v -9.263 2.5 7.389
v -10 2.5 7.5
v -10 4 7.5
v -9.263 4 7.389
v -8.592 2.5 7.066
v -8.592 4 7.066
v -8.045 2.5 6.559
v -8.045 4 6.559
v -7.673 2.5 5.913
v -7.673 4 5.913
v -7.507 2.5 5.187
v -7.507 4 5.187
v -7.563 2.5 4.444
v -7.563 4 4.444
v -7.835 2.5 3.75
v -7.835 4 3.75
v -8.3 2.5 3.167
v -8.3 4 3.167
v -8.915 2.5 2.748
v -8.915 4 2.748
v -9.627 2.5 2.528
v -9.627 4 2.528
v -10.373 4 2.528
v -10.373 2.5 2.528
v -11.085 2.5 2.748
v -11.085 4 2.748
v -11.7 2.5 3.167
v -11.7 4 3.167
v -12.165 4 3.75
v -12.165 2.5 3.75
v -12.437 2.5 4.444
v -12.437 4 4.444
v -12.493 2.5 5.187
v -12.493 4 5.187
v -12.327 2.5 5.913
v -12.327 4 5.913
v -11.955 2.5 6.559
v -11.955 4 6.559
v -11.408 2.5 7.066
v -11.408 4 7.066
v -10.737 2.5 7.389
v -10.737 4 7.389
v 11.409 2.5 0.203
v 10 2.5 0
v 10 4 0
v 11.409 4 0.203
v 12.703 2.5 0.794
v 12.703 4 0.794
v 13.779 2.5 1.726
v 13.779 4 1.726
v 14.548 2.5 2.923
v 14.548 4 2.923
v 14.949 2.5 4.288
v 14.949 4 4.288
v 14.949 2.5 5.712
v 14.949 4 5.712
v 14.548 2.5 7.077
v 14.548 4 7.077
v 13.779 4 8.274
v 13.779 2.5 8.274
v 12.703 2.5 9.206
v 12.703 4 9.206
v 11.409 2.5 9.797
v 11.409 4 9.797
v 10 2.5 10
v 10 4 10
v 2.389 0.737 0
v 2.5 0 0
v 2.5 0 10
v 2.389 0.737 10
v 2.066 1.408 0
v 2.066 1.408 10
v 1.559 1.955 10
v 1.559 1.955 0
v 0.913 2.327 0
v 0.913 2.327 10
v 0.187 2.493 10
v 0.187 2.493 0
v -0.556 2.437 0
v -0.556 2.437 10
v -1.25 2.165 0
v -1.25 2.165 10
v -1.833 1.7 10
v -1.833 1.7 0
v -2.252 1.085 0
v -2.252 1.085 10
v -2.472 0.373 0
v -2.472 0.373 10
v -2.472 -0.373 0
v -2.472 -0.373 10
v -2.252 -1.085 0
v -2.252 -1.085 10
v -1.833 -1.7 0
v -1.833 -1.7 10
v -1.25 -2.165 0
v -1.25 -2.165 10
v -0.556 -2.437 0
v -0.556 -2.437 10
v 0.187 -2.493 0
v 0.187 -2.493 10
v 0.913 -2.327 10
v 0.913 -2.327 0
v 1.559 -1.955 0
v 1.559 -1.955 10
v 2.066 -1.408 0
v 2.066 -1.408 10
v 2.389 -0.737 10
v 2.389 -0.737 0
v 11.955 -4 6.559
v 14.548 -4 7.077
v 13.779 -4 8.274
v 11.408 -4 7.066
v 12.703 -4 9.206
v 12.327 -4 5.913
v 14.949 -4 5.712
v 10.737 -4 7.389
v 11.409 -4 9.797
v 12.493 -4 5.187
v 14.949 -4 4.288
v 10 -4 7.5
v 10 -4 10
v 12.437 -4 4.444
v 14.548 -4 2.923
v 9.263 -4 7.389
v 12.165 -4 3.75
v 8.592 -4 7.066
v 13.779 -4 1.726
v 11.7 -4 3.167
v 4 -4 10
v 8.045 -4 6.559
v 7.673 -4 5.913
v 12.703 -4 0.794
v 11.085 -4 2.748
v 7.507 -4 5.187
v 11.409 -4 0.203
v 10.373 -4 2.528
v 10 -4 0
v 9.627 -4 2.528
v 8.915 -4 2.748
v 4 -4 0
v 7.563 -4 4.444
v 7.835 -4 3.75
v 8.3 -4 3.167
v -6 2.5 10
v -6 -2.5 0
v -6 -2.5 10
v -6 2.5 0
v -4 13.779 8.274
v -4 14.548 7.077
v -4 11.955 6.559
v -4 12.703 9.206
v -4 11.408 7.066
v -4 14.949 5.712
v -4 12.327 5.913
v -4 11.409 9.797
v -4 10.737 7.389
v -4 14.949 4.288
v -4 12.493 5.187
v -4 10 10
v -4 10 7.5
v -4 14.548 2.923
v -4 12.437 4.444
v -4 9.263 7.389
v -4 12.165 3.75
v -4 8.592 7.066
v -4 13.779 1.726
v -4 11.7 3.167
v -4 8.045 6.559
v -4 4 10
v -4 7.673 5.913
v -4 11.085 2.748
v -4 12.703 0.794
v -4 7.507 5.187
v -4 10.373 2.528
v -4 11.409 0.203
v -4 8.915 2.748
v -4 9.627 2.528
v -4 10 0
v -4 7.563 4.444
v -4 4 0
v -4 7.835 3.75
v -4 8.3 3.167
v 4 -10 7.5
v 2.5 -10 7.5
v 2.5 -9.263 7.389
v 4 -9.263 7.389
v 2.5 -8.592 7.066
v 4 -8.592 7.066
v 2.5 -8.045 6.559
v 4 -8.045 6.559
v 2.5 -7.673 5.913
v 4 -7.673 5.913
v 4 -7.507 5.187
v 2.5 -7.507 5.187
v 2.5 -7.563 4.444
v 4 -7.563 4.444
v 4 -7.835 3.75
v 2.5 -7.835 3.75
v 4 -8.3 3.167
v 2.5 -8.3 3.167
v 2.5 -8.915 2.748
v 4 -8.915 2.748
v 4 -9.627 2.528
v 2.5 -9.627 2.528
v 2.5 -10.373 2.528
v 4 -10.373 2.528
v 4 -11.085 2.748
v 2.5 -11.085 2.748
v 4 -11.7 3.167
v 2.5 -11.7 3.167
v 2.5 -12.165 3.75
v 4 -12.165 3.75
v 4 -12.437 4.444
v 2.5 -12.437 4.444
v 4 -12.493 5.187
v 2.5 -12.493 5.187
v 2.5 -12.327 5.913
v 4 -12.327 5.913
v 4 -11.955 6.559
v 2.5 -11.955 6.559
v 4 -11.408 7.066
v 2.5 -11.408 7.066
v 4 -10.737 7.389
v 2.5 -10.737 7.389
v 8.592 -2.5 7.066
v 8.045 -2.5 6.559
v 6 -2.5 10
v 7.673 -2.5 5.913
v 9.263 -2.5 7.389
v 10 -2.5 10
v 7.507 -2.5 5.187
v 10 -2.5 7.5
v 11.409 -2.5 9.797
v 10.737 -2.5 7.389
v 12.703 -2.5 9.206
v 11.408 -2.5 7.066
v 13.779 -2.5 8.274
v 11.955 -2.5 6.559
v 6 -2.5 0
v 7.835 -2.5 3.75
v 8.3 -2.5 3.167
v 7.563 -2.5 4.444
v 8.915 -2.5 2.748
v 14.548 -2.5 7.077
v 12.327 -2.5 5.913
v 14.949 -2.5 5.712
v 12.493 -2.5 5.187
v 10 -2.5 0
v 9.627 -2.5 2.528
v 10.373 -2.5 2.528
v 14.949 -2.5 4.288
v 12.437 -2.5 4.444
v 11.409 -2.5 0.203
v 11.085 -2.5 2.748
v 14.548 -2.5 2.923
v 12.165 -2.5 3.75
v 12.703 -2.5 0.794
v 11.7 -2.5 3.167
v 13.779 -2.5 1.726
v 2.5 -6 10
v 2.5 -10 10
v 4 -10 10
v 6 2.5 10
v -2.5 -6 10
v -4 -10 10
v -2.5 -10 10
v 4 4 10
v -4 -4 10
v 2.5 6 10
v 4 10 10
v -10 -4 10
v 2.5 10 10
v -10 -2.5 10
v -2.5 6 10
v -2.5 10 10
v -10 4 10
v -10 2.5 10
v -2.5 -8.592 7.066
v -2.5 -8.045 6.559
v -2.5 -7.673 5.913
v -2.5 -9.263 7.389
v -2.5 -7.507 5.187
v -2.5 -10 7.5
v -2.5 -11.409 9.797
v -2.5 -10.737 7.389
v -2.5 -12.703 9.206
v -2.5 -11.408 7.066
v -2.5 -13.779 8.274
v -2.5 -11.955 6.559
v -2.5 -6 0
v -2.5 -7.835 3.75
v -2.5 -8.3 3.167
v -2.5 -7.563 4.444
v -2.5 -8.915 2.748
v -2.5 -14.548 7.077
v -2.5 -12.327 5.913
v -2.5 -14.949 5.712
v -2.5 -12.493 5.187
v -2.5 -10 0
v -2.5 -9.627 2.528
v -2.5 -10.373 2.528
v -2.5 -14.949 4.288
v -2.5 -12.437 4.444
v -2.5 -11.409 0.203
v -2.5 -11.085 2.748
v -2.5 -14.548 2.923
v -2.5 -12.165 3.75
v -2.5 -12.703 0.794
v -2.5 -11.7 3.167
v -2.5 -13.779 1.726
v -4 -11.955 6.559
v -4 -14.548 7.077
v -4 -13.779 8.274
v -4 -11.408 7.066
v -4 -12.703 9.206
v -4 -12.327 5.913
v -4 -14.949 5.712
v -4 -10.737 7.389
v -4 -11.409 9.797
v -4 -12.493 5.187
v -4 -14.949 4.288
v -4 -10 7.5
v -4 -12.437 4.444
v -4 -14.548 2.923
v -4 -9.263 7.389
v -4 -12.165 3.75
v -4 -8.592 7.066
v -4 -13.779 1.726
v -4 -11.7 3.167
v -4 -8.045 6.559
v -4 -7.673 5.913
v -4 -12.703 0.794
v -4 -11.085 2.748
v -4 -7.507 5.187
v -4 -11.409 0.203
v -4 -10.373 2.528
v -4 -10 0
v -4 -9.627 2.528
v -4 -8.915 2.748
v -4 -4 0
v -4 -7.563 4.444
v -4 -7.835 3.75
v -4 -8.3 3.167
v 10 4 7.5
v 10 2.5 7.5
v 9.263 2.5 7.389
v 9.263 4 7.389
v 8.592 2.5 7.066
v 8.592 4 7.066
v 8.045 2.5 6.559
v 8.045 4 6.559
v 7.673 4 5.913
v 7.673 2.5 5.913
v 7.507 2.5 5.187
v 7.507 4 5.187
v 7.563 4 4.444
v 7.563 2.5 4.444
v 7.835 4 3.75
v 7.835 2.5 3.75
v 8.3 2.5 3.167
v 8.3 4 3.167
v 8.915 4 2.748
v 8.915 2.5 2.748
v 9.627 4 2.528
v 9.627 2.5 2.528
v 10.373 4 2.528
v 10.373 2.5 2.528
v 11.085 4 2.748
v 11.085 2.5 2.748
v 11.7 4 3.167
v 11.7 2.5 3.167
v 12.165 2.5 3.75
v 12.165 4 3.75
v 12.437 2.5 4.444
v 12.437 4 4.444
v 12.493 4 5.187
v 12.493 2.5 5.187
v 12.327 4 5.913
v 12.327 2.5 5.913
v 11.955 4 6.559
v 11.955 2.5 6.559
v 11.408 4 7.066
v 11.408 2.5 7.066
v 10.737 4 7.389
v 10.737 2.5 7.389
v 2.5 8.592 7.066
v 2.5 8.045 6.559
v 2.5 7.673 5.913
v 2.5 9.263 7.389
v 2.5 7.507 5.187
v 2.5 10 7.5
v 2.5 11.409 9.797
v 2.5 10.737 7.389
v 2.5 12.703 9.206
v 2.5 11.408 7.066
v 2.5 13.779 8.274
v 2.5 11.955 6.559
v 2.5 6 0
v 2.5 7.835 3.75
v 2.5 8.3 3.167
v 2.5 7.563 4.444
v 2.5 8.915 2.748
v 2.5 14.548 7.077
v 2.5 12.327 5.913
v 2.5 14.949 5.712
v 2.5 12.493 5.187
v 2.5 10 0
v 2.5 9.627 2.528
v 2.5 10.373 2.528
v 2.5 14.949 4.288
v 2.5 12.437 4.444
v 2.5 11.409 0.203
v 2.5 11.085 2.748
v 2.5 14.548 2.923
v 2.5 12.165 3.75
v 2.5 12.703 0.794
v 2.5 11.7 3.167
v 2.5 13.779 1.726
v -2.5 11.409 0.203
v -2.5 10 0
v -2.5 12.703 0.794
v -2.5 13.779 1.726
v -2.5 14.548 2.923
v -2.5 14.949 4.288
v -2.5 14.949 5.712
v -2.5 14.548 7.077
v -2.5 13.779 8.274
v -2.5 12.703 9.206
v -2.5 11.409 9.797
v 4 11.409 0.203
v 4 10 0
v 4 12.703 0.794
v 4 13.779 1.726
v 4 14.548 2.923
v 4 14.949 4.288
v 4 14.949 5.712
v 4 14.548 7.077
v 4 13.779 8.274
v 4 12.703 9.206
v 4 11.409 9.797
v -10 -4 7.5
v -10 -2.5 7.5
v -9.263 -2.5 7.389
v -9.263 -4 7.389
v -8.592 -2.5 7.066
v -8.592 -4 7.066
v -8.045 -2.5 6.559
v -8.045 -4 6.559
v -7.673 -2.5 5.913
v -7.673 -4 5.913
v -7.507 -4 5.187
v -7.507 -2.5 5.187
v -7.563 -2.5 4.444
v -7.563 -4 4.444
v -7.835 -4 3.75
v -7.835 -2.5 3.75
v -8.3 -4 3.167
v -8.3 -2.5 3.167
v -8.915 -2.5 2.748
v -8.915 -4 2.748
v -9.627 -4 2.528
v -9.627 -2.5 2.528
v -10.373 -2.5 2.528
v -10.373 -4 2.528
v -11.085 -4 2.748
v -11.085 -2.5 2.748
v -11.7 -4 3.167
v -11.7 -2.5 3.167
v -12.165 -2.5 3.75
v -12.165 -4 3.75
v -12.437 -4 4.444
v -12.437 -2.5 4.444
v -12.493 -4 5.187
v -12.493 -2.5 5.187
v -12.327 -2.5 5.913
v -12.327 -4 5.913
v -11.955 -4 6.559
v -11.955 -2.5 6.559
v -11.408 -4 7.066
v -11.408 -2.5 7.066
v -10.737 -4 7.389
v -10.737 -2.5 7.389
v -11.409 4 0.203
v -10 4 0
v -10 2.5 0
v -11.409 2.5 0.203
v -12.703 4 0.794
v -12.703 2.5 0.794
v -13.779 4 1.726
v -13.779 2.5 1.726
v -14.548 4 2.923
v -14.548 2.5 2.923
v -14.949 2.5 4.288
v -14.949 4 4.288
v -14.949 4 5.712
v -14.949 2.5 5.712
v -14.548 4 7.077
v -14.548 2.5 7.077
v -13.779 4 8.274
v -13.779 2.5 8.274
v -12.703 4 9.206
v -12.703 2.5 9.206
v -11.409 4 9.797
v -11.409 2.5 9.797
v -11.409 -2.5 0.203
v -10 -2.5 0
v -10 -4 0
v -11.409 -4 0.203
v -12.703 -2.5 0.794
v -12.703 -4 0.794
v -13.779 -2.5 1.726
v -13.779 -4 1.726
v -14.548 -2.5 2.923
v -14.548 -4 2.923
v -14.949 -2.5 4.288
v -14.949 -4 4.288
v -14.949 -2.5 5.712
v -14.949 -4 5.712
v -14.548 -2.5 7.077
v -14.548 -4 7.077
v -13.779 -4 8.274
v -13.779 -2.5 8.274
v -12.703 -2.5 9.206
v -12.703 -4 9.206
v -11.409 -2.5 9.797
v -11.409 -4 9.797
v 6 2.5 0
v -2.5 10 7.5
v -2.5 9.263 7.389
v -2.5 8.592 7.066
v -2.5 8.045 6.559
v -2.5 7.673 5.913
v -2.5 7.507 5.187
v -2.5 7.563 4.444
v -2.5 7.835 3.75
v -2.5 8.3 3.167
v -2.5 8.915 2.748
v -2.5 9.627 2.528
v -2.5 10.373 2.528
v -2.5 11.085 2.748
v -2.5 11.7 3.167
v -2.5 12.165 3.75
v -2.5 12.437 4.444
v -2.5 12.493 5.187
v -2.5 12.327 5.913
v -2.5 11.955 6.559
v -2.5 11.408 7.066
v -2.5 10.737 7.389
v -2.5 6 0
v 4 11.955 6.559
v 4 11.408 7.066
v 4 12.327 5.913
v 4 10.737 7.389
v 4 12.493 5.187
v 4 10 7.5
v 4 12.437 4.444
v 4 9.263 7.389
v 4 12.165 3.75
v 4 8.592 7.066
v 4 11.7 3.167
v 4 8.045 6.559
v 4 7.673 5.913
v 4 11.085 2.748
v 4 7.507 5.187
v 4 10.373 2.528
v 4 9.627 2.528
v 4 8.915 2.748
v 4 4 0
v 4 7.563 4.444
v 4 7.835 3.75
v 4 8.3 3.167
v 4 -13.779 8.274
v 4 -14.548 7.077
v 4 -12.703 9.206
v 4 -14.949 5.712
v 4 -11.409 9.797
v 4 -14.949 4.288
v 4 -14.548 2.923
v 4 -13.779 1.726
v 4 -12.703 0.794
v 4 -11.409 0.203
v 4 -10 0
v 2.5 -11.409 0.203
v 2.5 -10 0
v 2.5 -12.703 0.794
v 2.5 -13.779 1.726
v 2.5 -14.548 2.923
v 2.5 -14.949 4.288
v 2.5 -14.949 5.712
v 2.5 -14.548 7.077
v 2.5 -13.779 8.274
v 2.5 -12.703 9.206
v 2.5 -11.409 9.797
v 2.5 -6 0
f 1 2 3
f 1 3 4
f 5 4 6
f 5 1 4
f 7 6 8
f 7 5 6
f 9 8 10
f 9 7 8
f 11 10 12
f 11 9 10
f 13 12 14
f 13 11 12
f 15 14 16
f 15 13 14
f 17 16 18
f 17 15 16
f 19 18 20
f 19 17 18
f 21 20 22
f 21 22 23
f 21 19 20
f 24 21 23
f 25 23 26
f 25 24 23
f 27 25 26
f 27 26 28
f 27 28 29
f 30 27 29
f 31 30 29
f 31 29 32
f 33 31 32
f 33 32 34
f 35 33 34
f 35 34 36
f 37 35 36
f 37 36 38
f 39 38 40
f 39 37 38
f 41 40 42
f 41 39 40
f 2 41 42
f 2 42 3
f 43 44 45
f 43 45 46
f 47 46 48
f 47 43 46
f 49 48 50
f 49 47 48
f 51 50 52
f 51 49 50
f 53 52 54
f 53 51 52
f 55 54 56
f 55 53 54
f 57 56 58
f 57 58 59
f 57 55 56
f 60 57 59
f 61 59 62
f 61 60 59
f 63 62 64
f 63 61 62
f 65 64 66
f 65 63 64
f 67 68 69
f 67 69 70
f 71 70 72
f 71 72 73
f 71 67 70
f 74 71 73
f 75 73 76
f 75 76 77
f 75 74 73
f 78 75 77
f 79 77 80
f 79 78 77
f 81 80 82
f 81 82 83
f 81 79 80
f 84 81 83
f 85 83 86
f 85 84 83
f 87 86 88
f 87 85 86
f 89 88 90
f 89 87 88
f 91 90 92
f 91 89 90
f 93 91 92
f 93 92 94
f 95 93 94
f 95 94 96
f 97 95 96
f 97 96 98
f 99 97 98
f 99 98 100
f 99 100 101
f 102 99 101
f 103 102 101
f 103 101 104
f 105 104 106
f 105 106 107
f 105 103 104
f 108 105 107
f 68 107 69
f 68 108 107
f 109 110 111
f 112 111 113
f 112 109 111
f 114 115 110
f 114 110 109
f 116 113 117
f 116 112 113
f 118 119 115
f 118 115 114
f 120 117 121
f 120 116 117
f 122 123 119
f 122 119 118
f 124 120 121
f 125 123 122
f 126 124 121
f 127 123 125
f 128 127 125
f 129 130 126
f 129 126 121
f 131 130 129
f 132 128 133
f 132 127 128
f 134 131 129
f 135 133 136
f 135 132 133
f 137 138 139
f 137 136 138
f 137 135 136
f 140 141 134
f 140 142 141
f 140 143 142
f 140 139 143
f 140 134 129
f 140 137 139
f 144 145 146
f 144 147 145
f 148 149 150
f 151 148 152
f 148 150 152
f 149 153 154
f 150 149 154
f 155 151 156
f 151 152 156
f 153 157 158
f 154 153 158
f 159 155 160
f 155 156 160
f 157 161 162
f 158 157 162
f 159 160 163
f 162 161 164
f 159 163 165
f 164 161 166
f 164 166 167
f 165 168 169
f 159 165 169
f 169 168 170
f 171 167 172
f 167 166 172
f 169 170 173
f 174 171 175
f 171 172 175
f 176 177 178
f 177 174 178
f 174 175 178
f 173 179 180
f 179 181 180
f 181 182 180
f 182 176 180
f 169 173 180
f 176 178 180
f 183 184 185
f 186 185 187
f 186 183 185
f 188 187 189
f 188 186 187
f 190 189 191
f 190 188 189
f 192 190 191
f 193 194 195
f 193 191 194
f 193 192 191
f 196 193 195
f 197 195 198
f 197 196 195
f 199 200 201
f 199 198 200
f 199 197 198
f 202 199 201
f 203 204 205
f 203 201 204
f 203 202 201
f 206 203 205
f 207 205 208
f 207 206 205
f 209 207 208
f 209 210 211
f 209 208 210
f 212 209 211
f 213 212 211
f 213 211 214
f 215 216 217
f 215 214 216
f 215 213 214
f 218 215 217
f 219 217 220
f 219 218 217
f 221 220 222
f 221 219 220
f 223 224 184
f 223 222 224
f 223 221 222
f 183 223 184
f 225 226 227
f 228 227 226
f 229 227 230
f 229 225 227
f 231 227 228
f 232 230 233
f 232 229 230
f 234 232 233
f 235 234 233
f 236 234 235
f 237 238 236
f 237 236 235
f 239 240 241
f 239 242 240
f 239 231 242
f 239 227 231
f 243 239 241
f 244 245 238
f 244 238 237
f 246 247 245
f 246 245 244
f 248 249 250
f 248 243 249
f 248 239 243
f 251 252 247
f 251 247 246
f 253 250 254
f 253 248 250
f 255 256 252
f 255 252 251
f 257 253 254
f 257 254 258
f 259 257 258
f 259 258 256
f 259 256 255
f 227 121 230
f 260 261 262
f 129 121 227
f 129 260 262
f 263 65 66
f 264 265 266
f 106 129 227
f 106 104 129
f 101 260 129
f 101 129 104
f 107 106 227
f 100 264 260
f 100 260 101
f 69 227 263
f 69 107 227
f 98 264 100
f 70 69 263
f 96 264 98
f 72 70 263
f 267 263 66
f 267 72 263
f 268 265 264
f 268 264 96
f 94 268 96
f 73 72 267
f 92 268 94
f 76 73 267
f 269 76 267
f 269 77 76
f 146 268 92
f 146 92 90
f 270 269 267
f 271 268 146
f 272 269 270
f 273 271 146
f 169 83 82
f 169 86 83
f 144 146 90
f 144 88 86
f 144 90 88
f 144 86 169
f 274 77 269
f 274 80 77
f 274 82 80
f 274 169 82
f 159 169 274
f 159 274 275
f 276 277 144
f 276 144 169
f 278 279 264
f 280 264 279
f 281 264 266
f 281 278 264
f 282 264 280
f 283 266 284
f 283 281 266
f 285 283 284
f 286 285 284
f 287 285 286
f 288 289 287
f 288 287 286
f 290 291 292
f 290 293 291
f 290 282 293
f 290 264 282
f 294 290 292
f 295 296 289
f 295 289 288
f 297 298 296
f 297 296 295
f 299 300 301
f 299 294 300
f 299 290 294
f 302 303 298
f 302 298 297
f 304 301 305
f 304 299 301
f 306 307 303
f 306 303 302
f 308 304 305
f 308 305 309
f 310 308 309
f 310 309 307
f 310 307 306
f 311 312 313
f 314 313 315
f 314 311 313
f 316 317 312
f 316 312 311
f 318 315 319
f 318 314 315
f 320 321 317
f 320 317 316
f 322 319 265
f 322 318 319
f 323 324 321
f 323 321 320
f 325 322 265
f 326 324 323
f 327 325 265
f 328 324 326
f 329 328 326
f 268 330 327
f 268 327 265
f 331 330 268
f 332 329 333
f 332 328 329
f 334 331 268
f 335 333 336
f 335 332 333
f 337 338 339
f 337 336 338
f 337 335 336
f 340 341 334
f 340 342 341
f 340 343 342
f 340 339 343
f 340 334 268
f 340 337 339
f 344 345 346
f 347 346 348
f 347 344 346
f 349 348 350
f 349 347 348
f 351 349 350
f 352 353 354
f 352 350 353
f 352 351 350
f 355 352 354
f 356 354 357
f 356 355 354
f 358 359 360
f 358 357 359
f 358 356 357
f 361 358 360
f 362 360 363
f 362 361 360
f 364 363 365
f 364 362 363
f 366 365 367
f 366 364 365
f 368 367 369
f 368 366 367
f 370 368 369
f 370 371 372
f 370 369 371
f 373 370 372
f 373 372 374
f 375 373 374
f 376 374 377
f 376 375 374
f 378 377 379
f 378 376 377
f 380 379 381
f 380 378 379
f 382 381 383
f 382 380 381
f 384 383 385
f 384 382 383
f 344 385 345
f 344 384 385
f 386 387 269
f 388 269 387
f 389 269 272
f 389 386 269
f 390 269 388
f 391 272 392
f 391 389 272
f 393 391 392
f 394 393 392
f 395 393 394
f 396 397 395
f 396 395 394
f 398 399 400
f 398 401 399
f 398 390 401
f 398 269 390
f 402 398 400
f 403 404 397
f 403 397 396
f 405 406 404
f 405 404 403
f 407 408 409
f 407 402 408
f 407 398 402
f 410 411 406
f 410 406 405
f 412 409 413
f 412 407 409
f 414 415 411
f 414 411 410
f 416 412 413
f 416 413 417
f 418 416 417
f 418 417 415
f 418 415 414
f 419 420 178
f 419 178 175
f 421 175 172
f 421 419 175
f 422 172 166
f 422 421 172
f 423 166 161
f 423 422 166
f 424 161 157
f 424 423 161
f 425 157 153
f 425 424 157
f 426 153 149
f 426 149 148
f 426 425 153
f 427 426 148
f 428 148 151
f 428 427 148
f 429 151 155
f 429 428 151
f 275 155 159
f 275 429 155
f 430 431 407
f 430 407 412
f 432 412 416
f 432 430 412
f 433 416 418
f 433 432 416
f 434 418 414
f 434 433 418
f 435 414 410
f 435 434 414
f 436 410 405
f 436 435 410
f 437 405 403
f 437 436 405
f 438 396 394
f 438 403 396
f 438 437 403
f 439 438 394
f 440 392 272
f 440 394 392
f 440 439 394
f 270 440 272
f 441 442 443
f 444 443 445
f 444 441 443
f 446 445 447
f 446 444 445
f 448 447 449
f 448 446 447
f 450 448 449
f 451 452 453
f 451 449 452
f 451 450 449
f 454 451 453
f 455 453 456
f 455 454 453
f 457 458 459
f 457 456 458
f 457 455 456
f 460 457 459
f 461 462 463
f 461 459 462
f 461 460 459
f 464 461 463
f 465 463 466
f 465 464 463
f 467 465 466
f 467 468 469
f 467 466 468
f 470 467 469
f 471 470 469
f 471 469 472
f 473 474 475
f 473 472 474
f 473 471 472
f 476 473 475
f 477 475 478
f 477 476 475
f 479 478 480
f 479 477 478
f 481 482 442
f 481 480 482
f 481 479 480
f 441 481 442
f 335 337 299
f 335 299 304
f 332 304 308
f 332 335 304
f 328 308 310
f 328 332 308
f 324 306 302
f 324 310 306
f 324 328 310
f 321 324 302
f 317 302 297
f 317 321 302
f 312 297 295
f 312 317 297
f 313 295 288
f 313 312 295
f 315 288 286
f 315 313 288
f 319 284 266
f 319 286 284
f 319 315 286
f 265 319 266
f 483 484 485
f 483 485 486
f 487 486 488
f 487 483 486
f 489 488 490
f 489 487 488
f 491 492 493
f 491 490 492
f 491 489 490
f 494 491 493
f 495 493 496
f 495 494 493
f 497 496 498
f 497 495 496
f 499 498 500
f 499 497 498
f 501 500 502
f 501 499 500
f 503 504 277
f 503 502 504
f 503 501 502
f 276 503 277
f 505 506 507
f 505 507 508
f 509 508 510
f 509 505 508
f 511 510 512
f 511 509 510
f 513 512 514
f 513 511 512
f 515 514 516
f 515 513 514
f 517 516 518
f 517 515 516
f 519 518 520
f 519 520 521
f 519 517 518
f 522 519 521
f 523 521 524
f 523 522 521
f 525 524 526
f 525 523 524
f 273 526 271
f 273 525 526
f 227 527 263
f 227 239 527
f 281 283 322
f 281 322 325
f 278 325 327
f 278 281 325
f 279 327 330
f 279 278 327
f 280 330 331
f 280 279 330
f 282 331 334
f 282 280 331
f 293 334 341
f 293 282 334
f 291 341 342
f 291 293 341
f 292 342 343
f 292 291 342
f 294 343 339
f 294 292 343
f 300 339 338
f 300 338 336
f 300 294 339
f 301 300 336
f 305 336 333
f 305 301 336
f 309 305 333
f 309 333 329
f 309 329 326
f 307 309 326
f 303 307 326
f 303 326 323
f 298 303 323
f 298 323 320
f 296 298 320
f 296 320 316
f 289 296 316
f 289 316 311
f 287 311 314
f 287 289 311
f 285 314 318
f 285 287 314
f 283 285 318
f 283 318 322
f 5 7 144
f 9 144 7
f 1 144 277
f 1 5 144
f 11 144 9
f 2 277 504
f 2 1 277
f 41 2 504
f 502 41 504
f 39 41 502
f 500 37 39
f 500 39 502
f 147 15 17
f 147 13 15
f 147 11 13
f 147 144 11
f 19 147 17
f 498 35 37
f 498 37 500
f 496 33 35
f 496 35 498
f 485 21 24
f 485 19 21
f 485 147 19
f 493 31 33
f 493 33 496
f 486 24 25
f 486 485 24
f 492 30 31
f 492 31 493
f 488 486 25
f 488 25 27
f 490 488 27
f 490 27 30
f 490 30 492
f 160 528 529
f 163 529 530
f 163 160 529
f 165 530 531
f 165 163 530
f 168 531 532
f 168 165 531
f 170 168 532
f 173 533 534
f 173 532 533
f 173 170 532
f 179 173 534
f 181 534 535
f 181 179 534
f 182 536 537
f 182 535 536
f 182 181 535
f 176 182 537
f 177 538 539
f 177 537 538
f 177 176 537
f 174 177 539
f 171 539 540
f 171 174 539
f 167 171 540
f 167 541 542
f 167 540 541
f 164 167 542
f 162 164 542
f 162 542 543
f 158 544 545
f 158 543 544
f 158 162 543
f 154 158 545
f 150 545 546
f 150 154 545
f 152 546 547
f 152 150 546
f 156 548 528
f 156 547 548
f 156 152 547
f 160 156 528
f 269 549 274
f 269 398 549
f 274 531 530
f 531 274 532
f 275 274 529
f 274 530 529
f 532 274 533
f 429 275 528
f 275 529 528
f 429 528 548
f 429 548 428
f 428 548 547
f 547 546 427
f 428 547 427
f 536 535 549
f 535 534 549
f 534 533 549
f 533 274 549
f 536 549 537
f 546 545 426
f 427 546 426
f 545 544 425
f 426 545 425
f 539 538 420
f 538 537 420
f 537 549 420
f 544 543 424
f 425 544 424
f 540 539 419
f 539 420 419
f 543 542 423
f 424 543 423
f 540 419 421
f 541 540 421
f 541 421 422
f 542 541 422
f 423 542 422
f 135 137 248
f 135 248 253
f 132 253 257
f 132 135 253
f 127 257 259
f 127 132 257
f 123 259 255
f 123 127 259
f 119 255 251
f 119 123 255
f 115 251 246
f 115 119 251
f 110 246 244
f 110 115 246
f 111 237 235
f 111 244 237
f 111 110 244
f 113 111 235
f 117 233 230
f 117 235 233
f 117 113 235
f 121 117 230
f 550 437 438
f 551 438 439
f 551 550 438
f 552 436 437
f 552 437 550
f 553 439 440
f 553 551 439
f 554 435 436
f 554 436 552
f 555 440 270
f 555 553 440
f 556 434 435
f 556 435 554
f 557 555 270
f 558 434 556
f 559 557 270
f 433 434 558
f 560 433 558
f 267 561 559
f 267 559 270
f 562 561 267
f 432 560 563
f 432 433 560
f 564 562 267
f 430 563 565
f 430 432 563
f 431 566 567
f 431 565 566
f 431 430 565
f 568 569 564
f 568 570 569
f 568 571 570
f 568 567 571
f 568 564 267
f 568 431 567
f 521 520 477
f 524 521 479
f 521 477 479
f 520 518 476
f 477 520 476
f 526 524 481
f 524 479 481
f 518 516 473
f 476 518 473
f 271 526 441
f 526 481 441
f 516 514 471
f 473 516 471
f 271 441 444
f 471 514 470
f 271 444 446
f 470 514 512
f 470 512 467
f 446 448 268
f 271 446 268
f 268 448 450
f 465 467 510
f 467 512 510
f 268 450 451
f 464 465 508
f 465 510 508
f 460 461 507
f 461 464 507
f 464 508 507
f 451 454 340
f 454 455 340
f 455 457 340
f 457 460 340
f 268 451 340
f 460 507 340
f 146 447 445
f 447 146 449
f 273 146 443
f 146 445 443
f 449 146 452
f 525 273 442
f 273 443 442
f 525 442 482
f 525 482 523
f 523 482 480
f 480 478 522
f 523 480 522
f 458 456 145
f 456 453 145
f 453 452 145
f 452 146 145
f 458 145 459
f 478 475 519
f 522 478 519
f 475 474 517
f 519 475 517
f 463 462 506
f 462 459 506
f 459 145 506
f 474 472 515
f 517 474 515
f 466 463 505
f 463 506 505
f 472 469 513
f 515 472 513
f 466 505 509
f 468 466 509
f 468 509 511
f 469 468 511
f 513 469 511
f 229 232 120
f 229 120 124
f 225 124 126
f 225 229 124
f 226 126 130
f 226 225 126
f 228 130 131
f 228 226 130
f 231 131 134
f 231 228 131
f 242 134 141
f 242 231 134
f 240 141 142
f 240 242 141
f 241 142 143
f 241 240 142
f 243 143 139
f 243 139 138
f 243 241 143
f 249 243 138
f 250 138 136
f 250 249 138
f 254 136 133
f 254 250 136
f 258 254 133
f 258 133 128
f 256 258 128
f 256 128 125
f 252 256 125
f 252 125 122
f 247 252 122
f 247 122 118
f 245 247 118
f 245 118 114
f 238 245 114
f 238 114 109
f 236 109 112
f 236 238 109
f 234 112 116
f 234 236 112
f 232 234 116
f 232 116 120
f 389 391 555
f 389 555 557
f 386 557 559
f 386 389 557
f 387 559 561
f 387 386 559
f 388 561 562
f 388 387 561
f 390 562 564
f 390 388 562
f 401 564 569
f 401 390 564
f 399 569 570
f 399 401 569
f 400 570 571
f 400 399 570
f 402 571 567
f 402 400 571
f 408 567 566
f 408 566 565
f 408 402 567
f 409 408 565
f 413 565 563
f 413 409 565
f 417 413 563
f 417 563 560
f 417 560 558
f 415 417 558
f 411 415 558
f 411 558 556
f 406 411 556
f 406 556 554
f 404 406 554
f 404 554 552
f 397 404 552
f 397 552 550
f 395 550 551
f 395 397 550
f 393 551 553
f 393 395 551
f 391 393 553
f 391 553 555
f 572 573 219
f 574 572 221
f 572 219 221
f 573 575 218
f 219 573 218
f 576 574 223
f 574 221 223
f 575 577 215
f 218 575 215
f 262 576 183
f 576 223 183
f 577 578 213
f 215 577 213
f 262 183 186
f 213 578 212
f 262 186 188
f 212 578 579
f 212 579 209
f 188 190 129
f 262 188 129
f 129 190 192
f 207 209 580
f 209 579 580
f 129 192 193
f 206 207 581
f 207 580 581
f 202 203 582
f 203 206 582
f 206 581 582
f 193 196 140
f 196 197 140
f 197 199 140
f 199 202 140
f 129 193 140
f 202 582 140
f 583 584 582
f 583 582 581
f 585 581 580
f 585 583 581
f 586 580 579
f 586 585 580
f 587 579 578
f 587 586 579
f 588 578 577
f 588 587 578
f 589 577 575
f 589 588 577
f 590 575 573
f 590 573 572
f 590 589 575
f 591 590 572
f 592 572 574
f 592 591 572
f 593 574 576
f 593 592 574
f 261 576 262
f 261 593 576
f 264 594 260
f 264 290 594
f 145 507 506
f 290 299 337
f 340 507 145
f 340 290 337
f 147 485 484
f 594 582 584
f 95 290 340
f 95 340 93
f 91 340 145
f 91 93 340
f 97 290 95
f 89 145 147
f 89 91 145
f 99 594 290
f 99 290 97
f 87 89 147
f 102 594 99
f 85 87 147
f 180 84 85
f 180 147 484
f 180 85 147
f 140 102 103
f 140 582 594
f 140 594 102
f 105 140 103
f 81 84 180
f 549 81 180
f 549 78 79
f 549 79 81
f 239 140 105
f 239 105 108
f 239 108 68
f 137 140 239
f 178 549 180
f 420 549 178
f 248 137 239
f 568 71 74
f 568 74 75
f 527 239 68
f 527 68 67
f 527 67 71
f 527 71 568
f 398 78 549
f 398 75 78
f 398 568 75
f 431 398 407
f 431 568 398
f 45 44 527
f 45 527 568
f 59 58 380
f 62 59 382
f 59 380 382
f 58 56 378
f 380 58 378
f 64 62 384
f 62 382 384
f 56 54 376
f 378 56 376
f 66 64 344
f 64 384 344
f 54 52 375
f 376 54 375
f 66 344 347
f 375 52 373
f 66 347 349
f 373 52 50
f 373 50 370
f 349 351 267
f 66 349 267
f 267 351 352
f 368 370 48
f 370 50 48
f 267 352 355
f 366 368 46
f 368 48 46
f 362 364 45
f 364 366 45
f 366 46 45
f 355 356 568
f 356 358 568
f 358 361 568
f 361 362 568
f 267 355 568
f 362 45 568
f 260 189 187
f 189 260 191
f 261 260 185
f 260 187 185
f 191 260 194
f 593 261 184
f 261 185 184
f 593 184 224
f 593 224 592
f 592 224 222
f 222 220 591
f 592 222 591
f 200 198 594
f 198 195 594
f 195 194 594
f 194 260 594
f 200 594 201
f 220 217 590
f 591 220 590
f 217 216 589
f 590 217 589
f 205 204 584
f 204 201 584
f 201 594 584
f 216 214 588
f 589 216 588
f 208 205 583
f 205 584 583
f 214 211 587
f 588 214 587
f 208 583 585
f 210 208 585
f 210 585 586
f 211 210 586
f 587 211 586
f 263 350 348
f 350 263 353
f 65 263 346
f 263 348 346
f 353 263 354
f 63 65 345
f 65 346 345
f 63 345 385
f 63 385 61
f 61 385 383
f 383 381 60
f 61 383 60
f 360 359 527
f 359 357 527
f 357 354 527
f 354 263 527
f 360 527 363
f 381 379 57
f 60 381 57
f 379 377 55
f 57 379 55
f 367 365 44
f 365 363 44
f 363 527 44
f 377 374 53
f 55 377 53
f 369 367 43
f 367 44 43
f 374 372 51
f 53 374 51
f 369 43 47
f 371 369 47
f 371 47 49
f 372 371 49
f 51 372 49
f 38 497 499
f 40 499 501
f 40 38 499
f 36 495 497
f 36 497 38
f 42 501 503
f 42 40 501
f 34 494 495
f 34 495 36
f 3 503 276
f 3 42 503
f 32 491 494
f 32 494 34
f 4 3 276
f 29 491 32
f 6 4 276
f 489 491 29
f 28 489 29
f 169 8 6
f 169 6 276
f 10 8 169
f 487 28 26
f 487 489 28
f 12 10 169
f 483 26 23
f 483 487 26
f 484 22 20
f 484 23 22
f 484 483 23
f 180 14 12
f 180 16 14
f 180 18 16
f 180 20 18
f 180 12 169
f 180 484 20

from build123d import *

# Parameters (mm, degrees)
SKETCH_1_R               = 5
SKETCH_1_R_2             = 2.5
EXTRUDE_1_DEPTH          = 10
SKETCH_2_R               = 2.5
EXTRUDE_2_DEPTH          = 4
PATTERN_CIRCULAR_1_COUNT = 4
CUT_EXTRUDE_2_DEPTH      = 2.5
PATTERN_CIRCULAR_2_COUNT = 4
EXTRUDE_5_DEPTH          = 10
PATTERN_CIRCULAR_3_COUNT = 4


with BuildPart() as part:
    # 草图1 → 凸台-拉伸1 (new body)
    with BuildSketch(Plane.XY):
        Circle(SKETCH_1_R)
        Circle(SKETCH_1_R_2, mode=Mode.SUBTRACT)
    extrude(amount=EXTRUDE_1_DEPTH)

    # 草图2 → 凸台-拉伸2 (add, symmetric)
    with BuildSketch(Plane(origin=(0, 0, 0), x_dir=(1, 0, 0), z_dir=(0, 1, 0))):
        with BuildLine():
            Line((-5, 0), (-10, 0))
            ThreePointArc((-10, 0), (-15, -5), (-10, -10))
            Line((-10, -10), (-5, -10))
            Line((-5, -10), (-4.632725414, -10))
            Line((-4.632725414, -10), (-3.973155126, -10))
            Line((-3.973155126, -10), (-3.973155126, 0))
            Line((-3.973155126, 0), (-4.632725414, 0))
            Line((-4.632725414, 0), (-5, 0))
        make_face()
        with Locations(Location((-10, -5, 0), (0, 0, 270))):
            Circle(SKETCH_2_R, mode=Mode.SUBTRACT)
    extrude_2 = extrude(amount=EXTRUDE_2_DEPTH, both=True)

    # 阵列(圆周)1: 凸台-拉伸2 ×4 about axis
    pattern_circular_1_axis = Axis((0, 0, 0), (0, 0, 1))
    for i in range(1, PATTERN_CIRCULAR_1_COUNT):
        add(extrude_2.rotate(pattern_circular_1_axis, i * 360 / PATTERN_CIRCULAR_1_COUNT))

    # 草图4 → 切除-拉伸2 (cut, symmetric)
    with BuildSketch(Plane(origin=(0, 0, 0), x_dir=(1, 0, 0), z_dir=(0, 1, 0))):
        with BuildLine():
            Line((-10, 0), (-6, 0))
            Line((-6, 0), (-6, -10))
            Line((-6, -10), (-10, -10))
            ThreePointArc((-10, -10), (-15, -5), (-10, 0))
        make_face()
    cut_extrude_2 = extrude(amount=CUT_EXTRUDE_2_DEPTH, both=True, mode=Mode.SUBTRACT)

    # 阵列(圆周)2: 切除-拉伸2 ×4 about axis
    pattern_circular_2_axis = Axis((0, 0, 0), (0, 0, 1))
    for i in range(1, PATTERN_CIRCULAR_2_COUNT):
        add(cut_extrude_2.rotate(pattern_circular_2_axis, i * 360 / PATTERN_CIRCULAR_2_COUNT), mode=Mode.SUBTRACT)

    # 草图5 → 凸台-拉伸5 (add)
    with BuildSketch(Plane(origin=(0, 0, 0), x_dir=(-1, 0, 0), z_dir=(0, 0, -1))):
        Polygon((-3.973155126, 3.973155126), (-3.035463449, 3.973155126), (-3.973155126, 3.035463449), align=None)
    extrude_5 = extrude(amount=-EXTRUDE_5_DEPTH)

    # 阵列(圆周)3: 凸台-拉伸5 ×4 about axis
    pattern_circular_3_axis = Axis((0, 0, 0), (0, 0, -1))
    for i in range(1, PATTERN_CIRCULAR_3_COUNT):
        add(extrude_5.rotate(pattern_circular_3_axis, i * 360 / PATTERN_CIRCULAR_3_COUNT))


solid = part.part
